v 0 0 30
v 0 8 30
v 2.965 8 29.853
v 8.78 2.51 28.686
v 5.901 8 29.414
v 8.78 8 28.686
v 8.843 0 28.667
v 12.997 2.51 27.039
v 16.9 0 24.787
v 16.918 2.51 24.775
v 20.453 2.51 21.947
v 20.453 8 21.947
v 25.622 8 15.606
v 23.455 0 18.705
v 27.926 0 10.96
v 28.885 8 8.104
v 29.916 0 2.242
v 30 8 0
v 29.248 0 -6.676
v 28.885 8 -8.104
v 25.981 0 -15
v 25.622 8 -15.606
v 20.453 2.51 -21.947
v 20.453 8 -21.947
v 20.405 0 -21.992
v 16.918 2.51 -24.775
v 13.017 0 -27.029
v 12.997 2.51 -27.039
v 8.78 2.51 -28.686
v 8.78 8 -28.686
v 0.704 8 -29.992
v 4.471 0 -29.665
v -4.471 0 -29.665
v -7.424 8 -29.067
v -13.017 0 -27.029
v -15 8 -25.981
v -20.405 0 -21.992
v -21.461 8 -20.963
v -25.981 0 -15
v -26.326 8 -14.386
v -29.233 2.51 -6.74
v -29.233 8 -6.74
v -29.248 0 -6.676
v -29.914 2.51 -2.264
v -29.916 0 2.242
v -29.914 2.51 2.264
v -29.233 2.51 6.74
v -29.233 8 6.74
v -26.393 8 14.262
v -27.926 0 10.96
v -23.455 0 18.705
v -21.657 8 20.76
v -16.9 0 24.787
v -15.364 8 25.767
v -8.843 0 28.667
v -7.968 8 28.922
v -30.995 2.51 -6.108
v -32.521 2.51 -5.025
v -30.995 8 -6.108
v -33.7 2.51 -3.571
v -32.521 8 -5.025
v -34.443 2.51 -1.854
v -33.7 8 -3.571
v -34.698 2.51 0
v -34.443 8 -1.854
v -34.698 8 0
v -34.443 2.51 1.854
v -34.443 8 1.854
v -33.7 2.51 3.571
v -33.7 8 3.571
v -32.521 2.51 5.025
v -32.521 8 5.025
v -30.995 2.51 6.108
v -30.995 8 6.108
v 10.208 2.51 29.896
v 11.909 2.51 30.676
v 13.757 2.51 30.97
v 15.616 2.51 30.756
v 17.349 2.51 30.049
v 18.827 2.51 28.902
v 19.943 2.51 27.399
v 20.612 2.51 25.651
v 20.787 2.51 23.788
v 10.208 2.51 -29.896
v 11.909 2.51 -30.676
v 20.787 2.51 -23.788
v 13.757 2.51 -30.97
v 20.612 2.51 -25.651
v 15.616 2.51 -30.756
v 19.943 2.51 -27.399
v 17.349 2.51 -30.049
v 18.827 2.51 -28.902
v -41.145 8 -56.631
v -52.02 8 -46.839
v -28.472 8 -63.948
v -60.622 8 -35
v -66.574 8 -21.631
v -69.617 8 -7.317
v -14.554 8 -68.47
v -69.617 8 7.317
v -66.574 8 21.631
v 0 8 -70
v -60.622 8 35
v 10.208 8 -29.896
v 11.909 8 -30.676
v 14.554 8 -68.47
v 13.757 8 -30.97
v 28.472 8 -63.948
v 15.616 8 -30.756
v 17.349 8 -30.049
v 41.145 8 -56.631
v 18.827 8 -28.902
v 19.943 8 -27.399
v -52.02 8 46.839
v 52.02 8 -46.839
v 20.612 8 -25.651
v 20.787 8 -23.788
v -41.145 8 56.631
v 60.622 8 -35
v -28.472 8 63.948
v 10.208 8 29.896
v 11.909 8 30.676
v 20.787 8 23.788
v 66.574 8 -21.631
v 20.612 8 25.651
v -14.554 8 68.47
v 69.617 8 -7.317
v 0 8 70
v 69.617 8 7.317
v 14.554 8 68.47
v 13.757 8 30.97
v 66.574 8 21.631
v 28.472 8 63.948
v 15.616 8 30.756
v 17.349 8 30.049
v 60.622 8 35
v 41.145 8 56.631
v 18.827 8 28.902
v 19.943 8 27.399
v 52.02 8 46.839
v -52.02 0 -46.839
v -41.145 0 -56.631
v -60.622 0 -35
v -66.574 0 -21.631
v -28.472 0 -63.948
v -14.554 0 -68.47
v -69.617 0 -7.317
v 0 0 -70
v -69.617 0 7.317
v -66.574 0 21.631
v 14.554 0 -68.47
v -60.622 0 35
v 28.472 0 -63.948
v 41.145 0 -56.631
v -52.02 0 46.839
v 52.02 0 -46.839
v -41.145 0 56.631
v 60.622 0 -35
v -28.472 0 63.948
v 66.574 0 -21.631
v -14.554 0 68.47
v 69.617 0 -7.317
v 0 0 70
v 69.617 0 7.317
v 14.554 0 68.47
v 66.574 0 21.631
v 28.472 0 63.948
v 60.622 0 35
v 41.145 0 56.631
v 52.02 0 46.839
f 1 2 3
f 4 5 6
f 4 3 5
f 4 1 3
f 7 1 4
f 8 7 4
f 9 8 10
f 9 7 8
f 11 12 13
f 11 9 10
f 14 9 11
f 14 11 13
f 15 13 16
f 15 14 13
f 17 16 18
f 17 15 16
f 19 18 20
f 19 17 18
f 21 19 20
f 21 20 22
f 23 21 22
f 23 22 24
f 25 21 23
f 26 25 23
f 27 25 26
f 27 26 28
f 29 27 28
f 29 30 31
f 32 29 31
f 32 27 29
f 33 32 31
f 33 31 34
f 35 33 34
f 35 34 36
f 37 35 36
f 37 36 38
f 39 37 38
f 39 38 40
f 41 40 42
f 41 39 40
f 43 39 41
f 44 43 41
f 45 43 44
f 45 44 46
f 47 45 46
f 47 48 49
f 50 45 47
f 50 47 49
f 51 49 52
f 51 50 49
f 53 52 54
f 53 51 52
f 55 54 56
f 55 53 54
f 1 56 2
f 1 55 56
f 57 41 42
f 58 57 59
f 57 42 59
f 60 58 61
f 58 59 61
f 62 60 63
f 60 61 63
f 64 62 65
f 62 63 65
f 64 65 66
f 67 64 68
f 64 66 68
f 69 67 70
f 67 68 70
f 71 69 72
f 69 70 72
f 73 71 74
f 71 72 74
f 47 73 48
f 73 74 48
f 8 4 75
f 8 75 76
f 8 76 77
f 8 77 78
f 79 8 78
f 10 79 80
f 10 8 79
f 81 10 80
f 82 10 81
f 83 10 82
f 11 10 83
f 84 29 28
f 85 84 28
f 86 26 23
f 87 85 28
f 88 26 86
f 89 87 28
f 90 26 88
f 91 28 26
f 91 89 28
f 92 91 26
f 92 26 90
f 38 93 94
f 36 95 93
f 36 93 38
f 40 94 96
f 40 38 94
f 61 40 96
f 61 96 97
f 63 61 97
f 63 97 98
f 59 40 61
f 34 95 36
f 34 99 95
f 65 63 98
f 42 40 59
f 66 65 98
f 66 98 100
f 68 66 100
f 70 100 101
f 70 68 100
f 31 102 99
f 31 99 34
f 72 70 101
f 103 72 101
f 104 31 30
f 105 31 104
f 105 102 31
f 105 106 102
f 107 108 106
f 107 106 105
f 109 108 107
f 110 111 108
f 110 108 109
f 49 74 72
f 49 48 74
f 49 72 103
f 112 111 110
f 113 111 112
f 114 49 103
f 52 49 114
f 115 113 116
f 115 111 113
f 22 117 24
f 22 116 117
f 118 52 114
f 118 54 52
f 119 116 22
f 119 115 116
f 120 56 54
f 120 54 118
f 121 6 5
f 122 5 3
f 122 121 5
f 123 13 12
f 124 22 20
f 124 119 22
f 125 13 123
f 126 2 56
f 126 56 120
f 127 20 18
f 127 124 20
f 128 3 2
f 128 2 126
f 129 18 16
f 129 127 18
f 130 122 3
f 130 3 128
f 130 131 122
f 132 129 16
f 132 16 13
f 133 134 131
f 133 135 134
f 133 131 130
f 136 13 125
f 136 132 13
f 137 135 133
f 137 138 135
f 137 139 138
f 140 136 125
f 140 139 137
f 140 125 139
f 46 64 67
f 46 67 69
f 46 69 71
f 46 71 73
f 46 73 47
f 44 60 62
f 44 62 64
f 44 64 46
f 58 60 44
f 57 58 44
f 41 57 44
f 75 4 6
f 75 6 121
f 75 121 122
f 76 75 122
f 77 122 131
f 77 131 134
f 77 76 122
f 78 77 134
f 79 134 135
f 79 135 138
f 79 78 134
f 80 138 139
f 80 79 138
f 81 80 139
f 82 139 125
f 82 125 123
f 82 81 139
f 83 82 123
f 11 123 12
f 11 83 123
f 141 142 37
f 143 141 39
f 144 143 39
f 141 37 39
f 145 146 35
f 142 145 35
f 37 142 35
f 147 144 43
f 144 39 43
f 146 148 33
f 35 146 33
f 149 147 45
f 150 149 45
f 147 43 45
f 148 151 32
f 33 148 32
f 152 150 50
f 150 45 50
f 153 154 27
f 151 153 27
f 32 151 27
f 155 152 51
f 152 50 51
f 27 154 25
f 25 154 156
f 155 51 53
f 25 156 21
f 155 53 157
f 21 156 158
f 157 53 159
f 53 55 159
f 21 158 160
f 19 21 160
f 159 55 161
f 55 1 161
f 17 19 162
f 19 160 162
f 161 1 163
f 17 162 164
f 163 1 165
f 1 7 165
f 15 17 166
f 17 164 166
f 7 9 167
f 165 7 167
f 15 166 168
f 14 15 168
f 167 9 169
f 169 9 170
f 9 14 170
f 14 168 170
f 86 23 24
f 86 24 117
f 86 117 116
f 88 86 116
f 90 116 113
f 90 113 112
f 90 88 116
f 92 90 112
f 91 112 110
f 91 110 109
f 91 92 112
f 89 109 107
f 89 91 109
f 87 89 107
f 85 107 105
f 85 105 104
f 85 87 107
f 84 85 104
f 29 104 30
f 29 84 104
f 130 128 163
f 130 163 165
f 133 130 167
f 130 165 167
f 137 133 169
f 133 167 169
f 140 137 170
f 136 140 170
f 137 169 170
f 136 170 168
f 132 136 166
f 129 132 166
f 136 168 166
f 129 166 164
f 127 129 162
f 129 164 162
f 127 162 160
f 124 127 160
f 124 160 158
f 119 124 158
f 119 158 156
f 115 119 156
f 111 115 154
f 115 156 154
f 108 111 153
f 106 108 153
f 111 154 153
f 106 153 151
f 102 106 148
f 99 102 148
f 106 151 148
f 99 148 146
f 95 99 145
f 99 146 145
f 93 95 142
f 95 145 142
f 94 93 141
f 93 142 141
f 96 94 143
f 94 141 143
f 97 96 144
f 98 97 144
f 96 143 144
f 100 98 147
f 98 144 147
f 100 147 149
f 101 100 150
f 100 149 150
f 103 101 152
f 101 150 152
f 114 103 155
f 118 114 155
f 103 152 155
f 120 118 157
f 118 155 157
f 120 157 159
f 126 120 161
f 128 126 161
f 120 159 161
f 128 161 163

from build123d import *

# Parameters (mm, degrees)
SKETCH1_R           = 70
BOSS_EXTRUDE1_DEPTH = 8
SKETCH2_R           = 30
CUT_EXTRUDE1_DEPTH  = 100.317672143
SKETCH3_R           = 6.888520525
CUT_EXTRUDE2_DEPTH  = 5.490022236
CIRPATTERN1_COUNT   = 3


with BuildPart() as part:
    # Sketch1 → Boss-Extrude1 (new body)
    with BuildSketch(Plane(origin=(0, 0, 0), x_dir=(1, 0, 0), z_dir=(0, 1, 0))):
        Circle(SKETCH1_R)
    extrude(amount=BOSS_EXTRUDE1_DEPTH)

    # Sketch2 → Cut-Extrude1 (cut, through all)
    with BuildSketch(Plane(origin=(0, 0, 0), x_dir=(1, 0, 0), z_dir=(0, 1, 0))):
        Circle(SKETCH2_R)
    extrude(amount=CUT_EXTRUDE1_DEPTH, mode=Mode.SUBTRACT)

    # Sketch3 → Cut-Extrude2 (cut)
    with BuildSketch(Plane(origin=(0, 8, 0), x_dir=(1, 0, 0), z_dir=(0, 1, 0))):
        with Locations((-27.809030926, 0)):
            Circle(SKETCH3_R)
    cut_extrude2 = extrude(amount=-CUT_EXTRUDE2_DEPTH, mode=Mode.SUBTRACT)

    # CirPattern1: Cut-Extrude2 ×3 about axis
    cirpattern1_axis = Axis((0, 0, 0), (0, 1, 0))
    for i in range(1, CIRPATTERN1_COUNT):
        add(cut_extrude2.rotate(cirpattern1_axis, i * 360 / CIRPATTERN1_COUNT), mode=Mode.SUBTRACT)


solid = part.part
